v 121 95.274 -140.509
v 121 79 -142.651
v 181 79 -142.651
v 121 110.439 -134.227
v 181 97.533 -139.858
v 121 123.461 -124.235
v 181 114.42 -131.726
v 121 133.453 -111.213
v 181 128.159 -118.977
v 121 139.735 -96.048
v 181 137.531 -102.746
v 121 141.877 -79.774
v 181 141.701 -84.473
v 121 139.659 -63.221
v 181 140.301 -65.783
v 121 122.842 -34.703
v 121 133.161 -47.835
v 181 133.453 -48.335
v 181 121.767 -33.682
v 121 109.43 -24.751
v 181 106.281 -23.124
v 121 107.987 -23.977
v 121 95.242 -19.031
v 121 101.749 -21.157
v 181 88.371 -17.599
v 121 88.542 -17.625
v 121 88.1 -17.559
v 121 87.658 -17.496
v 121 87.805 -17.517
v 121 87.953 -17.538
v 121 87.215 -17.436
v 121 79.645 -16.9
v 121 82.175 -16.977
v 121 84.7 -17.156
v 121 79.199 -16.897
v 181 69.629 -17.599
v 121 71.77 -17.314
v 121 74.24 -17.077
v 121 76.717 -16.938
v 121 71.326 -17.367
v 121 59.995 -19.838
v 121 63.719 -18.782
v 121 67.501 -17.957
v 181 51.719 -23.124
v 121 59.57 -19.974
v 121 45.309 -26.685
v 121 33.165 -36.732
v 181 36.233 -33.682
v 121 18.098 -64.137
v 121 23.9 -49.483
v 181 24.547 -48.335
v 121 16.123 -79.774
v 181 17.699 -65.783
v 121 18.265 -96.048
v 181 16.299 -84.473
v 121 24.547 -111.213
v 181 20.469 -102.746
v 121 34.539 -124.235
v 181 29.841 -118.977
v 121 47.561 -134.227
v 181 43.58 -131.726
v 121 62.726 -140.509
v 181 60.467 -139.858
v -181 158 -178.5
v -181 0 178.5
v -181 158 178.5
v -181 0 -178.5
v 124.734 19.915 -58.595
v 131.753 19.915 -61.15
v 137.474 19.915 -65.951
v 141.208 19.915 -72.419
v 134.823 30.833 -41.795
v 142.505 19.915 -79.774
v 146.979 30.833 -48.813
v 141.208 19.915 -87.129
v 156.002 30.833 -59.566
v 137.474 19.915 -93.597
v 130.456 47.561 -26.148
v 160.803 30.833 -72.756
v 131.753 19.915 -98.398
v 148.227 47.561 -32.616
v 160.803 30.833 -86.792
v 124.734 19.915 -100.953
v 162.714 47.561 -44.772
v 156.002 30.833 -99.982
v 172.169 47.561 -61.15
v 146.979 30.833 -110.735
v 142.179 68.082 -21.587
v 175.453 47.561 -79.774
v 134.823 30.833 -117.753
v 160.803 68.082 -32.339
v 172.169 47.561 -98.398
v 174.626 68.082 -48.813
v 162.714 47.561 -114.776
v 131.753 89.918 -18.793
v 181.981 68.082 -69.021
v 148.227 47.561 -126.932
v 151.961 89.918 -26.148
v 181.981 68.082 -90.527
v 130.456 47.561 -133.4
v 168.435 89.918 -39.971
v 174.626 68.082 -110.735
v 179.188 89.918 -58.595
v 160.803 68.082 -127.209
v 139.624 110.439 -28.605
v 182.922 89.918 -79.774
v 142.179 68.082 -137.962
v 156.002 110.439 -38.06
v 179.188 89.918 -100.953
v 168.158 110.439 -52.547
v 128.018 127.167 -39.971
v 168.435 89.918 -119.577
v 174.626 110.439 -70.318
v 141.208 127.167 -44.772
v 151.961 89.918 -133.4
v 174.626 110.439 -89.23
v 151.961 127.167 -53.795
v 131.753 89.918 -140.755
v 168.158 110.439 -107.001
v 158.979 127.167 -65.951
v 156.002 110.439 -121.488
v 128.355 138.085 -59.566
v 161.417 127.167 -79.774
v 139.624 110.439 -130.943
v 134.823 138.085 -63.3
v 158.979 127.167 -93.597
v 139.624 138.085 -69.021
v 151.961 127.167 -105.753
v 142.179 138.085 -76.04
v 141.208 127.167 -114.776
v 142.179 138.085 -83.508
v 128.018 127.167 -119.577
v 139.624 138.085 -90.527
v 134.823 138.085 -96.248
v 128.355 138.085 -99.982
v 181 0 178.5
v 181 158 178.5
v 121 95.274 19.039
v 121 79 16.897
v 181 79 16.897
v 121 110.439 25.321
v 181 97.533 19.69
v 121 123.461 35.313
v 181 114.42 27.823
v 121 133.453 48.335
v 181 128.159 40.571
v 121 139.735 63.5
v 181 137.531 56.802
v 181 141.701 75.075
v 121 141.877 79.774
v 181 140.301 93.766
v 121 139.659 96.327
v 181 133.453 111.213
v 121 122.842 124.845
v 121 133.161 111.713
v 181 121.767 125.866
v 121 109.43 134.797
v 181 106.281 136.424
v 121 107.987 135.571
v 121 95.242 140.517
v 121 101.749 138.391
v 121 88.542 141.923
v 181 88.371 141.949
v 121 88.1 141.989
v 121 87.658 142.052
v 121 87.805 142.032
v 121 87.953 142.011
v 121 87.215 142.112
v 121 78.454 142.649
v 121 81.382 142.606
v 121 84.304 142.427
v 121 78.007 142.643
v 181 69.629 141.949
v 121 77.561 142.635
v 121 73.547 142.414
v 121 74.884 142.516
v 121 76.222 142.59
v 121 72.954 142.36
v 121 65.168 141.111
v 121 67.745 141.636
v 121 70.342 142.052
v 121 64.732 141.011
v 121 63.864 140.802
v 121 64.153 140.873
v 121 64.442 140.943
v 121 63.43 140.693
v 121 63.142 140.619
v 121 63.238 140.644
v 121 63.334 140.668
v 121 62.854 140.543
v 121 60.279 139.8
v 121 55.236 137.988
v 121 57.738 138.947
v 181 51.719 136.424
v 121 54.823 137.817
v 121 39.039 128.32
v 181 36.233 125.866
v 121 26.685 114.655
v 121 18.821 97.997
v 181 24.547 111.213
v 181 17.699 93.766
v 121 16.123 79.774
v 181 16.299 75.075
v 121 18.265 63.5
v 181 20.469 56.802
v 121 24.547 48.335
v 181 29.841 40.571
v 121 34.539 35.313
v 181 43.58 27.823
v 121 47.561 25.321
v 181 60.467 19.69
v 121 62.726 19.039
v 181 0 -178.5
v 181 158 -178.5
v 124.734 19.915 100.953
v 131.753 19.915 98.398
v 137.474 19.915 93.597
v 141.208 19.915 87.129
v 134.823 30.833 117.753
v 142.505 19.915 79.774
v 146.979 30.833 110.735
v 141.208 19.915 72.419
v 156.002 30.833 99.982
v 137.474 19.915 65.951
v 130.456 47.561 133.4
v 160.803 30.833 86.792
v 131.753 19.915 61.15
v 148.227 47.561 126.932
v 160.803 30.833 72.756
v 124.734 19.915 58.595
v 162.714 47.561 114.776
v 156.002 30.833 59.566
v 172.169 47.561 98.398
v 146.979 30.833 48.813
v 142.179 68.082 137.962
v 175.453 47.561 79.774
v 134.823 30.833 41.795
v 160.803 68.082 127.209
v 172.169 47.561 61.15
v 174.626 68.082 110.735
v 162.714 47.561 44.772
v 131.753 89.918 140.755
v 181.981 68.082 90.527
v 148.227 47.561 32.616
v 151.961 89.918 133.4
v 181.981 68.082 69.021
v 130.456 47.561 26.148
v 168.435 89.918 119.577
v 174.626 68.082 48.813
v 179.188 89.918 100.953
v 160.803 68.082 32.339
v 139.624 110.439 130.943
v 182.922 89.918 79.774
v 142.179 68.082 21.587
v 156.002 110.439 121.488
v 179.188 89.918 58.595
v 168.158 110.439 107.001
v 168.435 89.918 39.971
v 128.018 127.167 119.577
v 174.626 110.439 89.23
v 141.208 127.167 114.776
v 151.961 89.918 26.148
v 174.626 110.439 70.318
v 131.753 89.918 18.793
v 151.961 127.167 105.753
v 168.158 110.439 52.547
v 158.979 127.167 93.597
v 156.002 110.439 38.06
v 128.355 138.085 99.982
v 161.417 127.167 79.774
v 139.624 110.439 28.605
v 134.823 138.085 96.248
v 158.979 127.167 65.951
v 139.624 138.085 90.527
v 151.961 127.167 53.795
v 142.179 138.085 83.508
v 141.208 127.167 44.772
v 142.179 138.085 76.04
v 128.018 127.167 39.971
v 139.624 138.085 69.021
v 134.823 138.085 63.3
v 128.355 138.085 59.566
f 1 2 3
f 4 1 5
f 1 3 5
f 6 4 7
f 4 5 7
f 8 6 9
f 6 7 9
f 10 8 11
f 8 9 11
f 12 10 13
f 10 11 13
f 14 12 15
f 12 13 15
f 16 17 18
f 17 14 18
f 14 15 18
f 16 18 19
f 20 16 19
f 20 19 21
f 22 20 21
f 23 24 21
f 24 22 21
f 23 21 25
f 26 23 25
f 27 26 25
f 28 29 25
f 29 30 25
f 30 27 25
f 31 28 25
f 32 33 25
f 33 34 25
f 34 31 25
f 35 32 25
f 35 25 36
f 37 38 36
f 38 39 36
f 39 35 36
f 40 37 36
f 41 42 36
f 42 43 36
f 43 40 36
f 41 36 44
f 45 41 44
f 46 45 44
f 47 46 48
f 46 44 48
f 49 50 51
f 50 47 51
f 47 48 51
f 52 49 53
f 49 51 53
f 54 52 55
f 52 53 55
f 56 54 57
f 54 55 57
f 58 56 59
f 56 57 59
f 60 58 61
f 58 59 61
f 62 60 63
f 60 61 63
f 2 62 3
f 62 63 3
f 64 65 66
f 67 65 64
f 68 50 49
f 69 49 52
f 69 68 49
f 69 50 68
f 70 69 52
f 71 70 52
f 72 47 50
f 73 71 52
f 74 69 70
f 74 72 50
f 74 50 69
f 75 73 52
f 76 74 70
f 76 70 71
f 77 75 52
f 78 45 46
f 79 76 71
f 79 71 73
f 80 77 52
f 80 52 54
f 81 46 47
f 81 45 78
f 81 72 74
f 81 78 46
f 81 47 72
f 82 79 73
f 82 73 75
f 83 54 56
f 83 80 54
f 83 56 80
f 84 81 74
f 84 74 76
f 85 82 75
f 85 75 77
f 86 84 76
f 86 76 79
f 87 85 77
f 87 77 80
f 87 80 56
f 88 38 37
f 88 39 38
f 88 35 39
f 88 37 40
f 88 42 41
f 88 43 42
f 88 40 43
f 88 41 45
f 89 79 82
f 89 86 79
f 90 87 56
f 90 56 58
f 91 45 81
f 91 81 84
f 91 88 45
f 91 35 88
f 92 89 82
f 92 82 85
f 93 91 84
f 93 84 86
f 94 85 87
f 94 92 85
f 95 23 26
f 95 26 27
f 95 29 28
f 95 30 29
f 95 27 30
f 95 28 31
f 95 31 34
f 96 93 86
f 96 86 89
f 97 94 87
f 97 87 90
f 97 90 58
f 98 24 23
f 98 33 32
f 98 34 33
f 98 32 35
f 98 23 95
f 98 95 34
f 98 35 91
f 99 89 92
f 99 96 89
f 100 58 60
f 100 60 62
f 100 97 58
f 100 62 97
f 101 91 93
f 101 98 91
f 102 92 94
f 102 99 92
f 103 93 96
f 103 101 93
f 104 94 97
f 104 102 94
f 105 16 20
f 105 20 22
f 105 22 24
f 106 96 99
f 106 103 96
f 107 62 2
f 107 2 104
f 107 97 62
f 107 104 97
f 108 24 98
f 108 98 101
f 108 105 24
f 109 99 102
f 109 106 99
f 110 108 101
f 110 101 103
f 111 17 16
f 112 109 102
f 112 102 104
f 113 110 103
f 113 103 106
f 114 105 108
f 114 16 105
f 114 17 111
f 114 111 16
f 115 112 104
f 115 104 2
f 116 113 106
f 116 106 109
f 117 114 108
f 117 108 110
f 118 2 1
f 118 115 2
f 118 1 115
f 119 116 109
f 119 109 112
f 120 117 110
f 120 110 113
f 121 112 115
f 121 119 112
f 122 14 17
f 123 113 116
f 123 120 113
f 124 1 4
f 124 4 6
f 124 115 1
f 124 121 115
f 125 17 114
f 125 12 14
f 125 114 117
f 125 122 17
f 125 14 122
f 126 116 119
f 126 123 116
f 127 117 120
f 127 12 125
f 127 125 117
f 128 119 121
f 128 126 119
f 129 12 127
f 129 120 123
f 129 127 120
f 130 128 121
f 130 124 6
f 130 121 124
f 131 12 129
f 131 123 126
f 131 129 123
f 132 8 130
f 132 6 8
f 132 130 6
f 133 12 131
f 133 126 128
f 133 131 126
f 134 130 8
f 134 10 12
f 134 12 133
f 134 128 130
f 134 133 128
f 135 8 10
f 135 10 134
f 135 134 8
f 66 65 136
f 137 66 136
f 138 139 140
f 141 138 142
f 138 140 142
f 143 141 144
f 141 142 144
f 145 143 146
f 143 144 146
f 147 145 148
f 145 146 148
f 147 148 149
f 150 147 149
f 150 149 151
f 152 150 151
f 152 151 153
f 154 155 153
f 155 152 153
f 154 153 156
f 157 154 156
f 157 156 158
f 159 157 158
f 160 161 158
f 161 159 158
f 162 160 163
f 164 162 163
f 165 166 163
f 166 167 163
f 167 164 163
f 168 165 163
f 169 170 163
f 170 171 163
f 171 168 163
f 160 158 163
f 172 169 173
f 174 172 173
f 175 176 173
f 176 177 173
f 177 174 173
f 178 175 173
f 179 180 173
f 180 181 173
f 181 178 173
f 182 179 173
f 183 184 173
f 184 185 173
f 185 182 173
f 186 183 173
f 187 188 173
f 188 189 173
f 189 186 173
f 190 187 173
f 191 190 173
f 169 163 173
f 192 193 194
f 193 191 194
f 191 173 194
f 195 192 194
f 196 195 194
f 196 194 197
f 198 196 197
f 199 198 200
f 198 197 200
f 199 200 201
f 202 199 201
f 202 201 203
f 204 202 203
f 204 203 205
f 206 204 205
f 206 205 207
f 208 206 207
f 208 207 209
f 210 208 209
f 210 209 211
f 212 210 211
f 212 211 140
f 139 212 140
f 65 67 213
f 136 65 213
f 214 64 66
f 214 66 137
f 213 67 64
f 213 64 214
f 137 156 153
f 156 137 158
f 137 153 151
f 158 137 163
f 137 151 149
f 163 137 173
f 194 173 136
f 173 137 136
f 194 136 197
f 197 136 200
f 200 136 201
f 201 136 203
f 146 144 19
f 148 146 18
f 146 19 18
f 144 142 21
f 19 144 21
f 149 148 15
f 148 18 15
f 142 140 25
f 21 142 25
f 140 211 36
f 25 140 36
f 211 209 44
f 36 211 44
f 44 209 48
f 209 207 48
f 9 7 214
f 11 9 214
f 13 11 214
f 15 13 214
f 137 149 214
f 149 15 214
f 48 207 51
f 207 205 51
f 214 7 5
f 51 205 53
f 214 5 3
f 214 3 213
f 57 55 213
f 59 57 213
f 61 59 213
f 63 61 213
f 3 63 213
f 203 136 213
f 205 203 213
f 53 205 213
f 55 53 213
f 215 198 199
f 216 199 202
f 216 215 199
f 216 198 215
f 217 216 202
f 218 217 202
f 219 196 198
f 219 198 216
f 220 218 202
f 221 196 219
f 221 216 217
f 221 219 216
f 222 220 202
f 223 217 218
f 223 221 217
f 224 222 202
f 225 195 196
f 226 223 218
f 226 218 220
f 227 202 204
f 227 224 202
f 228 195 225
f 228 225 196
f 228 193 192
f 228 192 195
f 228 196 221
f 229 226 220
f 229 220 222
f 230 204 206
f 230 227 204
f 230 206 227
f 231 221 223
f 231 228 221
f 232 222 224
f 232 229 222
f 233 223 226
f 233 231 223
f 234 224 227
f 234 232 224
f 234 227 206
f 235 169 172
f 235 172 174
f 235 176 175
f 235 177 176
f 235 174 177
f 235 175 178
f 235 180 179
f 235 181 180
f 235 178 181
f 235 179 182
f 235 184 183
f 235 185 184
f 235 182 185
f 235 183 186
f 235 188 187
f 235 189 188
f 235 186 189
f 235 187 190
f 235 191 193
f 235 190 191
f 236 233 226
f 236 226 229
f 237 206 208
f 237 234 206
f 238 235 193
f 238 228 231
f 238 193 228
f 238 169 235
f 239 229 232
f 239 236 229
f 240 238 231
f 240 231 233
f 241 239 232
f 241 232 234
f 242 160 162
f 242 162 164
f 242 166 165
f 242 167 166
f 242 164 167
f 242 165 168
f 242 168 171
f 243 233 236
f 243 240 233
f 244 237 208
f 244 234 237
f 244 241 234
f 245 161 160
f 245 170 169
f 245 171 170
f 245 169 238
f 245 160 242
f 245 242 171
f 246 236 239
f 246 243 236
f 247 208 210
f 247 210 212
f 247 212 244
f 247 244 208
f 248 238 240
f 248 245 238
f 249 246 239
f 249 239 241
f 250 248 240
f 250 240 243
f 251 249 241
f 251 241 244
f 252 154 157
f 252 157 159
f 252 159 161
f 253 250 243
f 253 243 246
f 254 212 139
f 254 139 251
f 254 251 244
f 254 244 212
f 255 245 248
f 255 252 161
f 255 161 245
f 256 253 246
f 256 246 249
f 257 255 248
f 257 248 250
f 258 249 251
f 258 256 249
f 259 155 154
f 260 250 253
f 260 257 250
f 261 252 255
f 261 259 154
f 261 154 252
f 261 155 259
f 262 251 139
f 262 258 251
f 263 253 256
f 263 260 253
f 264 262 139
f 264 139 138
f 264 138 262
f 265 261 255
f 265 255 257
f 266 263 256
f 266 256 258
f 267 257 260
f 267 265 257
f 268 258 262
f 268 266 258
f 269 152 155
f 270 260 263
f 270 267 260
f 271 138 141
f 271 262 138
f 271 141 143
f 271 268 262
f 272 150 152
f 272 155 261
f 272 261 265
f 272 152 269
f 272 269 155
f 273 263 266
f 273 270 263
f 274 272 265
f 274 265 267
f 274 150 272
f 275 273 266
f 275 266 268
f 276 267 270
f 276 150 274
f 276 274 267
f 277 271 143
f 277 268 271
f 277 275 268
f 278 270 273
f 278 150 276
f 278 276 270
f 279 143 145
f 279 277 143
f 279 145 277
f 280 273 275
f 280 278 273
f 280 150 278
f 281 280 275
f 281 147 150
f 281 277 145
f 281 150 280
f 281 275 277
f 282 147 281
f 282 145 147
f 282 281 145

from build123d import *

# Parameters (mm, degrees)
SKETCH1_W           = 362
SKETCH1_H           = 357
BOSS_EXTRUDE1_DEPTH = 158
SKETCH2_R           = 62.877116211
CUT_EXTRUDE1_DEPTH  = 60
REVOLVE1_ANGLE      = 180
REVOLVE2_ANGLE      = 180


with BuildPart() as part:
    # Sketch1 → Boss-Extrude1 (new body)
    with BuildSketch(Plane(origin=(0, 0, 0), x_dir=(1, 0, 0), z_dir=(0, 1, 0))):
        Rectangle(SKETCH1_W, SKETCH1_H)
    extrude(amount=BOSS_EXTRUDE1_DEPTH)

    # Sketch2 → Cut-Extrude1 (cut)
    with BuildSketch(Plane(origin=(181, 0, 0), x_dir=(0, 0, -1), z_dir=(1, 0, 0))):
        with Locations((-79.77402599, 79)):
            Circle(SKETCH2_R)
        with Locations((79.77402599, 79)):
            Circle(SKETCH2_R)
    extrude(amount=-CUT_EXTRUDE1_DEPTH, mode=Mode.SUBTRACT)

    # Sketch3 → Revolve1 (revolve)
    with BuildSketch(Plane(origin=(121, 0, 0), x_dir=(0, 0, -1), z_dir=(1, 0, 0))):
        with BuildLine():
            Line((-79.77402599, 141.877116211), (-79.77402599, 16.122883789))
            ThreePointArc((-79.77402599, 16.122883789), (-142.651142201, 79), (-79.77402599, 141.877116211))
        make_face()
    revolve(axis=Axis((121, 141.877116211, 79.77402599), (0, 1, 0)), revolution_arc=REVOLVE1_ANGLE)

    # Sketch4 → Revolve2 (revolve)
    with BuildSketch(Plane(origin=(121, 0, 0), x_dir=(0, 0, -1), z_dir=(1, 0, 0))):
        with BuildLine():
            Line((79.77402599, 141.877116211), (79.77402599, 16.122883789))
            ThreePointArc((79.77402599, 16.122883789), (16.896909779, 79), (79.77402599, 141.877116211))
        make_face()
    revolve(axis=Axis((121, 141.877116211, -79.77402599), (0, 1, 0)), revolution_arc=REVOLVE2_ANGLE)


solid = part.part
